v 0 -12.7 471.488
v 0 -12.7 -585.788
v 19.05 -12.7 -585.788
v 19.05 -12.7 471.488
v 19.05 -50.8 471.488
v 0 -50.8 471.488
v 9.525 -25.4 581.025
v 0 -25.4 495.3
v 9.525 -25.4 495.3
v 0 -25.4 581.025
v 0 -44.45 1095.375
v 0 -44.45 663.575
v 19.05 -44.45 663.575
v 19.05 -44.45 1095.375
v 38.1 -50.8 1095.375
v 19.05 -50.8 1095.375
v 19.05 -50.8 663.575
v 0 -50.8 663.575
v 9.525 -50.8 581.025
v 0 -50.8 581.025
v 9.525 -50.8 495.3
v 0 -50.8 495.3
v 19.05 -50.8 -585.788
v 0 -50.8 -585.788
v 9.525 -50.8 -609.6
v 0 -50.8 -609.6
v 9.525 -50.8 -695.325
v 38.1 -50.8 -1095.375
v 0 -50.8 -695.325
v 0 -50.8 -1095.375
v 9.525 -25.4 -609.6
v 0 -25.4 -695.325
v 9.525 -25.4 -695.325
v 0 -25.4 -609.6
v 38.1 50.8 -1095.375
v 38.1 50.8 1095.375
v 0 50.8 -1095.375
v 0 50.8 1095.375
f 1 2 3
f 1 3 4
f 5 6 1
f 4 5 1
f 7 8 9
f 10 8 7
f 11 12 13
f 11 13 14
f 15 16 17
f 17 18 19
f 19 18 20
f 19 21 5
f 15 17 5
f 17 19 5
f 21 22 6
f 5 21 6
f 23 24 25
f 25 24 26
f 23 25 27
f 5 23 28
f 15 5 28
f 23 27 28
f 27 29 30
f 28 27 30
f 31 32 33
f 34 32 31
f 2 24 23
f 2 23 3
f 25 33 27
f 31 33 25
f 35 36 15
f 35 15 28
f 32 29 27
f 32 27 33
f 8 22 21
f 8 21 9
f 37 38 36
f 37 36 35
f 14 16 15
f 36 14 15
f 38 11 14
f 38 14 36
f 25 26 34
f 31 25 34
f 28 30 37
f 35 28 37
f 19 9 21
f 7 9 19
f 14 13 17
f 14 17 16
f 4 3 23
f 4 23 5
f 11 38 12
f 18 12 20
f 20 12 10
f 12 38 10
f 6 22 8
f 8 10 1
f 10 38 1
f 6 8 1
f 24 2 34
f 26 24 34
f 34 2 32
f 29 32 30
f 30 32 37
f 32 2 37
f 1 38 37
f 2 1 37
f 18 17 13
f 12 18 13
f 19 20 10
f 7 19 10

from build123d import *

# Parameters (mm, degrees)
SKETCH1_W           = 2190.75
SKETCH1_H           = 101.6
BOSS_EXTRUDE1_DEPTH = 38.1
SKETCH3_W           = 431.8
SKETCH3_H           = 6.35
SKETCH3_W_2         = 1057.275
SKETCH3_H_2         = 38.1
CUT_EXTRUDE1_DEPTH  = 19.05
SKETCH3_3_W         = 85.725
SKETCH3_3_H         = 25.4
CUT_EXTRUDE2_DEPTH  = 9.525


with BuildPart() as part:
    # Sketch1 → Boss-Extrude1 (new body)
    with BuildSketch(Plane(origin=(0, 0, 0), x_dir=(0, 0, -1), z_dir=(1, 0, 0))):
        Rectangle(SKETCH1_W, SKETCH1_H)
    extrude(amount=BOSS_EXTRUDE1_DEPTH)

    # Sketch3 → Cut-Extrude1 (cut)
    with BuildSketch(Plane.ZY):
        with Locations((879.475, -47.625)):
            Rectangle(SKETCH3_W, SKETCH3_H)
        with Locations((-57.15, -31.75)):
            Rectangle(SKETCH3_W_2, SKETCH3_H_2)
    extrude(amount=-CUT_EXTRUDE1_DEPTH, mode=Mode.SUBTRACT)

    # Sketch3<3> → Cut-Extrude2 (cut)
    with BuildSketch(Plane.ZY):
        with Locations((-652.4625, -38.1)):
            Rectangle(SKETCH3_3_W, SKETCH3_3_H)
        with Locations((538.1625, -38.1)):
            Rectangle(SKETCH3_3_W, SKETCH3_3_H)
    extrude(amount=-CUT_EXTRUDE2_DEPTH, mode=Mode.SUBTRACT)


solid = part.part
